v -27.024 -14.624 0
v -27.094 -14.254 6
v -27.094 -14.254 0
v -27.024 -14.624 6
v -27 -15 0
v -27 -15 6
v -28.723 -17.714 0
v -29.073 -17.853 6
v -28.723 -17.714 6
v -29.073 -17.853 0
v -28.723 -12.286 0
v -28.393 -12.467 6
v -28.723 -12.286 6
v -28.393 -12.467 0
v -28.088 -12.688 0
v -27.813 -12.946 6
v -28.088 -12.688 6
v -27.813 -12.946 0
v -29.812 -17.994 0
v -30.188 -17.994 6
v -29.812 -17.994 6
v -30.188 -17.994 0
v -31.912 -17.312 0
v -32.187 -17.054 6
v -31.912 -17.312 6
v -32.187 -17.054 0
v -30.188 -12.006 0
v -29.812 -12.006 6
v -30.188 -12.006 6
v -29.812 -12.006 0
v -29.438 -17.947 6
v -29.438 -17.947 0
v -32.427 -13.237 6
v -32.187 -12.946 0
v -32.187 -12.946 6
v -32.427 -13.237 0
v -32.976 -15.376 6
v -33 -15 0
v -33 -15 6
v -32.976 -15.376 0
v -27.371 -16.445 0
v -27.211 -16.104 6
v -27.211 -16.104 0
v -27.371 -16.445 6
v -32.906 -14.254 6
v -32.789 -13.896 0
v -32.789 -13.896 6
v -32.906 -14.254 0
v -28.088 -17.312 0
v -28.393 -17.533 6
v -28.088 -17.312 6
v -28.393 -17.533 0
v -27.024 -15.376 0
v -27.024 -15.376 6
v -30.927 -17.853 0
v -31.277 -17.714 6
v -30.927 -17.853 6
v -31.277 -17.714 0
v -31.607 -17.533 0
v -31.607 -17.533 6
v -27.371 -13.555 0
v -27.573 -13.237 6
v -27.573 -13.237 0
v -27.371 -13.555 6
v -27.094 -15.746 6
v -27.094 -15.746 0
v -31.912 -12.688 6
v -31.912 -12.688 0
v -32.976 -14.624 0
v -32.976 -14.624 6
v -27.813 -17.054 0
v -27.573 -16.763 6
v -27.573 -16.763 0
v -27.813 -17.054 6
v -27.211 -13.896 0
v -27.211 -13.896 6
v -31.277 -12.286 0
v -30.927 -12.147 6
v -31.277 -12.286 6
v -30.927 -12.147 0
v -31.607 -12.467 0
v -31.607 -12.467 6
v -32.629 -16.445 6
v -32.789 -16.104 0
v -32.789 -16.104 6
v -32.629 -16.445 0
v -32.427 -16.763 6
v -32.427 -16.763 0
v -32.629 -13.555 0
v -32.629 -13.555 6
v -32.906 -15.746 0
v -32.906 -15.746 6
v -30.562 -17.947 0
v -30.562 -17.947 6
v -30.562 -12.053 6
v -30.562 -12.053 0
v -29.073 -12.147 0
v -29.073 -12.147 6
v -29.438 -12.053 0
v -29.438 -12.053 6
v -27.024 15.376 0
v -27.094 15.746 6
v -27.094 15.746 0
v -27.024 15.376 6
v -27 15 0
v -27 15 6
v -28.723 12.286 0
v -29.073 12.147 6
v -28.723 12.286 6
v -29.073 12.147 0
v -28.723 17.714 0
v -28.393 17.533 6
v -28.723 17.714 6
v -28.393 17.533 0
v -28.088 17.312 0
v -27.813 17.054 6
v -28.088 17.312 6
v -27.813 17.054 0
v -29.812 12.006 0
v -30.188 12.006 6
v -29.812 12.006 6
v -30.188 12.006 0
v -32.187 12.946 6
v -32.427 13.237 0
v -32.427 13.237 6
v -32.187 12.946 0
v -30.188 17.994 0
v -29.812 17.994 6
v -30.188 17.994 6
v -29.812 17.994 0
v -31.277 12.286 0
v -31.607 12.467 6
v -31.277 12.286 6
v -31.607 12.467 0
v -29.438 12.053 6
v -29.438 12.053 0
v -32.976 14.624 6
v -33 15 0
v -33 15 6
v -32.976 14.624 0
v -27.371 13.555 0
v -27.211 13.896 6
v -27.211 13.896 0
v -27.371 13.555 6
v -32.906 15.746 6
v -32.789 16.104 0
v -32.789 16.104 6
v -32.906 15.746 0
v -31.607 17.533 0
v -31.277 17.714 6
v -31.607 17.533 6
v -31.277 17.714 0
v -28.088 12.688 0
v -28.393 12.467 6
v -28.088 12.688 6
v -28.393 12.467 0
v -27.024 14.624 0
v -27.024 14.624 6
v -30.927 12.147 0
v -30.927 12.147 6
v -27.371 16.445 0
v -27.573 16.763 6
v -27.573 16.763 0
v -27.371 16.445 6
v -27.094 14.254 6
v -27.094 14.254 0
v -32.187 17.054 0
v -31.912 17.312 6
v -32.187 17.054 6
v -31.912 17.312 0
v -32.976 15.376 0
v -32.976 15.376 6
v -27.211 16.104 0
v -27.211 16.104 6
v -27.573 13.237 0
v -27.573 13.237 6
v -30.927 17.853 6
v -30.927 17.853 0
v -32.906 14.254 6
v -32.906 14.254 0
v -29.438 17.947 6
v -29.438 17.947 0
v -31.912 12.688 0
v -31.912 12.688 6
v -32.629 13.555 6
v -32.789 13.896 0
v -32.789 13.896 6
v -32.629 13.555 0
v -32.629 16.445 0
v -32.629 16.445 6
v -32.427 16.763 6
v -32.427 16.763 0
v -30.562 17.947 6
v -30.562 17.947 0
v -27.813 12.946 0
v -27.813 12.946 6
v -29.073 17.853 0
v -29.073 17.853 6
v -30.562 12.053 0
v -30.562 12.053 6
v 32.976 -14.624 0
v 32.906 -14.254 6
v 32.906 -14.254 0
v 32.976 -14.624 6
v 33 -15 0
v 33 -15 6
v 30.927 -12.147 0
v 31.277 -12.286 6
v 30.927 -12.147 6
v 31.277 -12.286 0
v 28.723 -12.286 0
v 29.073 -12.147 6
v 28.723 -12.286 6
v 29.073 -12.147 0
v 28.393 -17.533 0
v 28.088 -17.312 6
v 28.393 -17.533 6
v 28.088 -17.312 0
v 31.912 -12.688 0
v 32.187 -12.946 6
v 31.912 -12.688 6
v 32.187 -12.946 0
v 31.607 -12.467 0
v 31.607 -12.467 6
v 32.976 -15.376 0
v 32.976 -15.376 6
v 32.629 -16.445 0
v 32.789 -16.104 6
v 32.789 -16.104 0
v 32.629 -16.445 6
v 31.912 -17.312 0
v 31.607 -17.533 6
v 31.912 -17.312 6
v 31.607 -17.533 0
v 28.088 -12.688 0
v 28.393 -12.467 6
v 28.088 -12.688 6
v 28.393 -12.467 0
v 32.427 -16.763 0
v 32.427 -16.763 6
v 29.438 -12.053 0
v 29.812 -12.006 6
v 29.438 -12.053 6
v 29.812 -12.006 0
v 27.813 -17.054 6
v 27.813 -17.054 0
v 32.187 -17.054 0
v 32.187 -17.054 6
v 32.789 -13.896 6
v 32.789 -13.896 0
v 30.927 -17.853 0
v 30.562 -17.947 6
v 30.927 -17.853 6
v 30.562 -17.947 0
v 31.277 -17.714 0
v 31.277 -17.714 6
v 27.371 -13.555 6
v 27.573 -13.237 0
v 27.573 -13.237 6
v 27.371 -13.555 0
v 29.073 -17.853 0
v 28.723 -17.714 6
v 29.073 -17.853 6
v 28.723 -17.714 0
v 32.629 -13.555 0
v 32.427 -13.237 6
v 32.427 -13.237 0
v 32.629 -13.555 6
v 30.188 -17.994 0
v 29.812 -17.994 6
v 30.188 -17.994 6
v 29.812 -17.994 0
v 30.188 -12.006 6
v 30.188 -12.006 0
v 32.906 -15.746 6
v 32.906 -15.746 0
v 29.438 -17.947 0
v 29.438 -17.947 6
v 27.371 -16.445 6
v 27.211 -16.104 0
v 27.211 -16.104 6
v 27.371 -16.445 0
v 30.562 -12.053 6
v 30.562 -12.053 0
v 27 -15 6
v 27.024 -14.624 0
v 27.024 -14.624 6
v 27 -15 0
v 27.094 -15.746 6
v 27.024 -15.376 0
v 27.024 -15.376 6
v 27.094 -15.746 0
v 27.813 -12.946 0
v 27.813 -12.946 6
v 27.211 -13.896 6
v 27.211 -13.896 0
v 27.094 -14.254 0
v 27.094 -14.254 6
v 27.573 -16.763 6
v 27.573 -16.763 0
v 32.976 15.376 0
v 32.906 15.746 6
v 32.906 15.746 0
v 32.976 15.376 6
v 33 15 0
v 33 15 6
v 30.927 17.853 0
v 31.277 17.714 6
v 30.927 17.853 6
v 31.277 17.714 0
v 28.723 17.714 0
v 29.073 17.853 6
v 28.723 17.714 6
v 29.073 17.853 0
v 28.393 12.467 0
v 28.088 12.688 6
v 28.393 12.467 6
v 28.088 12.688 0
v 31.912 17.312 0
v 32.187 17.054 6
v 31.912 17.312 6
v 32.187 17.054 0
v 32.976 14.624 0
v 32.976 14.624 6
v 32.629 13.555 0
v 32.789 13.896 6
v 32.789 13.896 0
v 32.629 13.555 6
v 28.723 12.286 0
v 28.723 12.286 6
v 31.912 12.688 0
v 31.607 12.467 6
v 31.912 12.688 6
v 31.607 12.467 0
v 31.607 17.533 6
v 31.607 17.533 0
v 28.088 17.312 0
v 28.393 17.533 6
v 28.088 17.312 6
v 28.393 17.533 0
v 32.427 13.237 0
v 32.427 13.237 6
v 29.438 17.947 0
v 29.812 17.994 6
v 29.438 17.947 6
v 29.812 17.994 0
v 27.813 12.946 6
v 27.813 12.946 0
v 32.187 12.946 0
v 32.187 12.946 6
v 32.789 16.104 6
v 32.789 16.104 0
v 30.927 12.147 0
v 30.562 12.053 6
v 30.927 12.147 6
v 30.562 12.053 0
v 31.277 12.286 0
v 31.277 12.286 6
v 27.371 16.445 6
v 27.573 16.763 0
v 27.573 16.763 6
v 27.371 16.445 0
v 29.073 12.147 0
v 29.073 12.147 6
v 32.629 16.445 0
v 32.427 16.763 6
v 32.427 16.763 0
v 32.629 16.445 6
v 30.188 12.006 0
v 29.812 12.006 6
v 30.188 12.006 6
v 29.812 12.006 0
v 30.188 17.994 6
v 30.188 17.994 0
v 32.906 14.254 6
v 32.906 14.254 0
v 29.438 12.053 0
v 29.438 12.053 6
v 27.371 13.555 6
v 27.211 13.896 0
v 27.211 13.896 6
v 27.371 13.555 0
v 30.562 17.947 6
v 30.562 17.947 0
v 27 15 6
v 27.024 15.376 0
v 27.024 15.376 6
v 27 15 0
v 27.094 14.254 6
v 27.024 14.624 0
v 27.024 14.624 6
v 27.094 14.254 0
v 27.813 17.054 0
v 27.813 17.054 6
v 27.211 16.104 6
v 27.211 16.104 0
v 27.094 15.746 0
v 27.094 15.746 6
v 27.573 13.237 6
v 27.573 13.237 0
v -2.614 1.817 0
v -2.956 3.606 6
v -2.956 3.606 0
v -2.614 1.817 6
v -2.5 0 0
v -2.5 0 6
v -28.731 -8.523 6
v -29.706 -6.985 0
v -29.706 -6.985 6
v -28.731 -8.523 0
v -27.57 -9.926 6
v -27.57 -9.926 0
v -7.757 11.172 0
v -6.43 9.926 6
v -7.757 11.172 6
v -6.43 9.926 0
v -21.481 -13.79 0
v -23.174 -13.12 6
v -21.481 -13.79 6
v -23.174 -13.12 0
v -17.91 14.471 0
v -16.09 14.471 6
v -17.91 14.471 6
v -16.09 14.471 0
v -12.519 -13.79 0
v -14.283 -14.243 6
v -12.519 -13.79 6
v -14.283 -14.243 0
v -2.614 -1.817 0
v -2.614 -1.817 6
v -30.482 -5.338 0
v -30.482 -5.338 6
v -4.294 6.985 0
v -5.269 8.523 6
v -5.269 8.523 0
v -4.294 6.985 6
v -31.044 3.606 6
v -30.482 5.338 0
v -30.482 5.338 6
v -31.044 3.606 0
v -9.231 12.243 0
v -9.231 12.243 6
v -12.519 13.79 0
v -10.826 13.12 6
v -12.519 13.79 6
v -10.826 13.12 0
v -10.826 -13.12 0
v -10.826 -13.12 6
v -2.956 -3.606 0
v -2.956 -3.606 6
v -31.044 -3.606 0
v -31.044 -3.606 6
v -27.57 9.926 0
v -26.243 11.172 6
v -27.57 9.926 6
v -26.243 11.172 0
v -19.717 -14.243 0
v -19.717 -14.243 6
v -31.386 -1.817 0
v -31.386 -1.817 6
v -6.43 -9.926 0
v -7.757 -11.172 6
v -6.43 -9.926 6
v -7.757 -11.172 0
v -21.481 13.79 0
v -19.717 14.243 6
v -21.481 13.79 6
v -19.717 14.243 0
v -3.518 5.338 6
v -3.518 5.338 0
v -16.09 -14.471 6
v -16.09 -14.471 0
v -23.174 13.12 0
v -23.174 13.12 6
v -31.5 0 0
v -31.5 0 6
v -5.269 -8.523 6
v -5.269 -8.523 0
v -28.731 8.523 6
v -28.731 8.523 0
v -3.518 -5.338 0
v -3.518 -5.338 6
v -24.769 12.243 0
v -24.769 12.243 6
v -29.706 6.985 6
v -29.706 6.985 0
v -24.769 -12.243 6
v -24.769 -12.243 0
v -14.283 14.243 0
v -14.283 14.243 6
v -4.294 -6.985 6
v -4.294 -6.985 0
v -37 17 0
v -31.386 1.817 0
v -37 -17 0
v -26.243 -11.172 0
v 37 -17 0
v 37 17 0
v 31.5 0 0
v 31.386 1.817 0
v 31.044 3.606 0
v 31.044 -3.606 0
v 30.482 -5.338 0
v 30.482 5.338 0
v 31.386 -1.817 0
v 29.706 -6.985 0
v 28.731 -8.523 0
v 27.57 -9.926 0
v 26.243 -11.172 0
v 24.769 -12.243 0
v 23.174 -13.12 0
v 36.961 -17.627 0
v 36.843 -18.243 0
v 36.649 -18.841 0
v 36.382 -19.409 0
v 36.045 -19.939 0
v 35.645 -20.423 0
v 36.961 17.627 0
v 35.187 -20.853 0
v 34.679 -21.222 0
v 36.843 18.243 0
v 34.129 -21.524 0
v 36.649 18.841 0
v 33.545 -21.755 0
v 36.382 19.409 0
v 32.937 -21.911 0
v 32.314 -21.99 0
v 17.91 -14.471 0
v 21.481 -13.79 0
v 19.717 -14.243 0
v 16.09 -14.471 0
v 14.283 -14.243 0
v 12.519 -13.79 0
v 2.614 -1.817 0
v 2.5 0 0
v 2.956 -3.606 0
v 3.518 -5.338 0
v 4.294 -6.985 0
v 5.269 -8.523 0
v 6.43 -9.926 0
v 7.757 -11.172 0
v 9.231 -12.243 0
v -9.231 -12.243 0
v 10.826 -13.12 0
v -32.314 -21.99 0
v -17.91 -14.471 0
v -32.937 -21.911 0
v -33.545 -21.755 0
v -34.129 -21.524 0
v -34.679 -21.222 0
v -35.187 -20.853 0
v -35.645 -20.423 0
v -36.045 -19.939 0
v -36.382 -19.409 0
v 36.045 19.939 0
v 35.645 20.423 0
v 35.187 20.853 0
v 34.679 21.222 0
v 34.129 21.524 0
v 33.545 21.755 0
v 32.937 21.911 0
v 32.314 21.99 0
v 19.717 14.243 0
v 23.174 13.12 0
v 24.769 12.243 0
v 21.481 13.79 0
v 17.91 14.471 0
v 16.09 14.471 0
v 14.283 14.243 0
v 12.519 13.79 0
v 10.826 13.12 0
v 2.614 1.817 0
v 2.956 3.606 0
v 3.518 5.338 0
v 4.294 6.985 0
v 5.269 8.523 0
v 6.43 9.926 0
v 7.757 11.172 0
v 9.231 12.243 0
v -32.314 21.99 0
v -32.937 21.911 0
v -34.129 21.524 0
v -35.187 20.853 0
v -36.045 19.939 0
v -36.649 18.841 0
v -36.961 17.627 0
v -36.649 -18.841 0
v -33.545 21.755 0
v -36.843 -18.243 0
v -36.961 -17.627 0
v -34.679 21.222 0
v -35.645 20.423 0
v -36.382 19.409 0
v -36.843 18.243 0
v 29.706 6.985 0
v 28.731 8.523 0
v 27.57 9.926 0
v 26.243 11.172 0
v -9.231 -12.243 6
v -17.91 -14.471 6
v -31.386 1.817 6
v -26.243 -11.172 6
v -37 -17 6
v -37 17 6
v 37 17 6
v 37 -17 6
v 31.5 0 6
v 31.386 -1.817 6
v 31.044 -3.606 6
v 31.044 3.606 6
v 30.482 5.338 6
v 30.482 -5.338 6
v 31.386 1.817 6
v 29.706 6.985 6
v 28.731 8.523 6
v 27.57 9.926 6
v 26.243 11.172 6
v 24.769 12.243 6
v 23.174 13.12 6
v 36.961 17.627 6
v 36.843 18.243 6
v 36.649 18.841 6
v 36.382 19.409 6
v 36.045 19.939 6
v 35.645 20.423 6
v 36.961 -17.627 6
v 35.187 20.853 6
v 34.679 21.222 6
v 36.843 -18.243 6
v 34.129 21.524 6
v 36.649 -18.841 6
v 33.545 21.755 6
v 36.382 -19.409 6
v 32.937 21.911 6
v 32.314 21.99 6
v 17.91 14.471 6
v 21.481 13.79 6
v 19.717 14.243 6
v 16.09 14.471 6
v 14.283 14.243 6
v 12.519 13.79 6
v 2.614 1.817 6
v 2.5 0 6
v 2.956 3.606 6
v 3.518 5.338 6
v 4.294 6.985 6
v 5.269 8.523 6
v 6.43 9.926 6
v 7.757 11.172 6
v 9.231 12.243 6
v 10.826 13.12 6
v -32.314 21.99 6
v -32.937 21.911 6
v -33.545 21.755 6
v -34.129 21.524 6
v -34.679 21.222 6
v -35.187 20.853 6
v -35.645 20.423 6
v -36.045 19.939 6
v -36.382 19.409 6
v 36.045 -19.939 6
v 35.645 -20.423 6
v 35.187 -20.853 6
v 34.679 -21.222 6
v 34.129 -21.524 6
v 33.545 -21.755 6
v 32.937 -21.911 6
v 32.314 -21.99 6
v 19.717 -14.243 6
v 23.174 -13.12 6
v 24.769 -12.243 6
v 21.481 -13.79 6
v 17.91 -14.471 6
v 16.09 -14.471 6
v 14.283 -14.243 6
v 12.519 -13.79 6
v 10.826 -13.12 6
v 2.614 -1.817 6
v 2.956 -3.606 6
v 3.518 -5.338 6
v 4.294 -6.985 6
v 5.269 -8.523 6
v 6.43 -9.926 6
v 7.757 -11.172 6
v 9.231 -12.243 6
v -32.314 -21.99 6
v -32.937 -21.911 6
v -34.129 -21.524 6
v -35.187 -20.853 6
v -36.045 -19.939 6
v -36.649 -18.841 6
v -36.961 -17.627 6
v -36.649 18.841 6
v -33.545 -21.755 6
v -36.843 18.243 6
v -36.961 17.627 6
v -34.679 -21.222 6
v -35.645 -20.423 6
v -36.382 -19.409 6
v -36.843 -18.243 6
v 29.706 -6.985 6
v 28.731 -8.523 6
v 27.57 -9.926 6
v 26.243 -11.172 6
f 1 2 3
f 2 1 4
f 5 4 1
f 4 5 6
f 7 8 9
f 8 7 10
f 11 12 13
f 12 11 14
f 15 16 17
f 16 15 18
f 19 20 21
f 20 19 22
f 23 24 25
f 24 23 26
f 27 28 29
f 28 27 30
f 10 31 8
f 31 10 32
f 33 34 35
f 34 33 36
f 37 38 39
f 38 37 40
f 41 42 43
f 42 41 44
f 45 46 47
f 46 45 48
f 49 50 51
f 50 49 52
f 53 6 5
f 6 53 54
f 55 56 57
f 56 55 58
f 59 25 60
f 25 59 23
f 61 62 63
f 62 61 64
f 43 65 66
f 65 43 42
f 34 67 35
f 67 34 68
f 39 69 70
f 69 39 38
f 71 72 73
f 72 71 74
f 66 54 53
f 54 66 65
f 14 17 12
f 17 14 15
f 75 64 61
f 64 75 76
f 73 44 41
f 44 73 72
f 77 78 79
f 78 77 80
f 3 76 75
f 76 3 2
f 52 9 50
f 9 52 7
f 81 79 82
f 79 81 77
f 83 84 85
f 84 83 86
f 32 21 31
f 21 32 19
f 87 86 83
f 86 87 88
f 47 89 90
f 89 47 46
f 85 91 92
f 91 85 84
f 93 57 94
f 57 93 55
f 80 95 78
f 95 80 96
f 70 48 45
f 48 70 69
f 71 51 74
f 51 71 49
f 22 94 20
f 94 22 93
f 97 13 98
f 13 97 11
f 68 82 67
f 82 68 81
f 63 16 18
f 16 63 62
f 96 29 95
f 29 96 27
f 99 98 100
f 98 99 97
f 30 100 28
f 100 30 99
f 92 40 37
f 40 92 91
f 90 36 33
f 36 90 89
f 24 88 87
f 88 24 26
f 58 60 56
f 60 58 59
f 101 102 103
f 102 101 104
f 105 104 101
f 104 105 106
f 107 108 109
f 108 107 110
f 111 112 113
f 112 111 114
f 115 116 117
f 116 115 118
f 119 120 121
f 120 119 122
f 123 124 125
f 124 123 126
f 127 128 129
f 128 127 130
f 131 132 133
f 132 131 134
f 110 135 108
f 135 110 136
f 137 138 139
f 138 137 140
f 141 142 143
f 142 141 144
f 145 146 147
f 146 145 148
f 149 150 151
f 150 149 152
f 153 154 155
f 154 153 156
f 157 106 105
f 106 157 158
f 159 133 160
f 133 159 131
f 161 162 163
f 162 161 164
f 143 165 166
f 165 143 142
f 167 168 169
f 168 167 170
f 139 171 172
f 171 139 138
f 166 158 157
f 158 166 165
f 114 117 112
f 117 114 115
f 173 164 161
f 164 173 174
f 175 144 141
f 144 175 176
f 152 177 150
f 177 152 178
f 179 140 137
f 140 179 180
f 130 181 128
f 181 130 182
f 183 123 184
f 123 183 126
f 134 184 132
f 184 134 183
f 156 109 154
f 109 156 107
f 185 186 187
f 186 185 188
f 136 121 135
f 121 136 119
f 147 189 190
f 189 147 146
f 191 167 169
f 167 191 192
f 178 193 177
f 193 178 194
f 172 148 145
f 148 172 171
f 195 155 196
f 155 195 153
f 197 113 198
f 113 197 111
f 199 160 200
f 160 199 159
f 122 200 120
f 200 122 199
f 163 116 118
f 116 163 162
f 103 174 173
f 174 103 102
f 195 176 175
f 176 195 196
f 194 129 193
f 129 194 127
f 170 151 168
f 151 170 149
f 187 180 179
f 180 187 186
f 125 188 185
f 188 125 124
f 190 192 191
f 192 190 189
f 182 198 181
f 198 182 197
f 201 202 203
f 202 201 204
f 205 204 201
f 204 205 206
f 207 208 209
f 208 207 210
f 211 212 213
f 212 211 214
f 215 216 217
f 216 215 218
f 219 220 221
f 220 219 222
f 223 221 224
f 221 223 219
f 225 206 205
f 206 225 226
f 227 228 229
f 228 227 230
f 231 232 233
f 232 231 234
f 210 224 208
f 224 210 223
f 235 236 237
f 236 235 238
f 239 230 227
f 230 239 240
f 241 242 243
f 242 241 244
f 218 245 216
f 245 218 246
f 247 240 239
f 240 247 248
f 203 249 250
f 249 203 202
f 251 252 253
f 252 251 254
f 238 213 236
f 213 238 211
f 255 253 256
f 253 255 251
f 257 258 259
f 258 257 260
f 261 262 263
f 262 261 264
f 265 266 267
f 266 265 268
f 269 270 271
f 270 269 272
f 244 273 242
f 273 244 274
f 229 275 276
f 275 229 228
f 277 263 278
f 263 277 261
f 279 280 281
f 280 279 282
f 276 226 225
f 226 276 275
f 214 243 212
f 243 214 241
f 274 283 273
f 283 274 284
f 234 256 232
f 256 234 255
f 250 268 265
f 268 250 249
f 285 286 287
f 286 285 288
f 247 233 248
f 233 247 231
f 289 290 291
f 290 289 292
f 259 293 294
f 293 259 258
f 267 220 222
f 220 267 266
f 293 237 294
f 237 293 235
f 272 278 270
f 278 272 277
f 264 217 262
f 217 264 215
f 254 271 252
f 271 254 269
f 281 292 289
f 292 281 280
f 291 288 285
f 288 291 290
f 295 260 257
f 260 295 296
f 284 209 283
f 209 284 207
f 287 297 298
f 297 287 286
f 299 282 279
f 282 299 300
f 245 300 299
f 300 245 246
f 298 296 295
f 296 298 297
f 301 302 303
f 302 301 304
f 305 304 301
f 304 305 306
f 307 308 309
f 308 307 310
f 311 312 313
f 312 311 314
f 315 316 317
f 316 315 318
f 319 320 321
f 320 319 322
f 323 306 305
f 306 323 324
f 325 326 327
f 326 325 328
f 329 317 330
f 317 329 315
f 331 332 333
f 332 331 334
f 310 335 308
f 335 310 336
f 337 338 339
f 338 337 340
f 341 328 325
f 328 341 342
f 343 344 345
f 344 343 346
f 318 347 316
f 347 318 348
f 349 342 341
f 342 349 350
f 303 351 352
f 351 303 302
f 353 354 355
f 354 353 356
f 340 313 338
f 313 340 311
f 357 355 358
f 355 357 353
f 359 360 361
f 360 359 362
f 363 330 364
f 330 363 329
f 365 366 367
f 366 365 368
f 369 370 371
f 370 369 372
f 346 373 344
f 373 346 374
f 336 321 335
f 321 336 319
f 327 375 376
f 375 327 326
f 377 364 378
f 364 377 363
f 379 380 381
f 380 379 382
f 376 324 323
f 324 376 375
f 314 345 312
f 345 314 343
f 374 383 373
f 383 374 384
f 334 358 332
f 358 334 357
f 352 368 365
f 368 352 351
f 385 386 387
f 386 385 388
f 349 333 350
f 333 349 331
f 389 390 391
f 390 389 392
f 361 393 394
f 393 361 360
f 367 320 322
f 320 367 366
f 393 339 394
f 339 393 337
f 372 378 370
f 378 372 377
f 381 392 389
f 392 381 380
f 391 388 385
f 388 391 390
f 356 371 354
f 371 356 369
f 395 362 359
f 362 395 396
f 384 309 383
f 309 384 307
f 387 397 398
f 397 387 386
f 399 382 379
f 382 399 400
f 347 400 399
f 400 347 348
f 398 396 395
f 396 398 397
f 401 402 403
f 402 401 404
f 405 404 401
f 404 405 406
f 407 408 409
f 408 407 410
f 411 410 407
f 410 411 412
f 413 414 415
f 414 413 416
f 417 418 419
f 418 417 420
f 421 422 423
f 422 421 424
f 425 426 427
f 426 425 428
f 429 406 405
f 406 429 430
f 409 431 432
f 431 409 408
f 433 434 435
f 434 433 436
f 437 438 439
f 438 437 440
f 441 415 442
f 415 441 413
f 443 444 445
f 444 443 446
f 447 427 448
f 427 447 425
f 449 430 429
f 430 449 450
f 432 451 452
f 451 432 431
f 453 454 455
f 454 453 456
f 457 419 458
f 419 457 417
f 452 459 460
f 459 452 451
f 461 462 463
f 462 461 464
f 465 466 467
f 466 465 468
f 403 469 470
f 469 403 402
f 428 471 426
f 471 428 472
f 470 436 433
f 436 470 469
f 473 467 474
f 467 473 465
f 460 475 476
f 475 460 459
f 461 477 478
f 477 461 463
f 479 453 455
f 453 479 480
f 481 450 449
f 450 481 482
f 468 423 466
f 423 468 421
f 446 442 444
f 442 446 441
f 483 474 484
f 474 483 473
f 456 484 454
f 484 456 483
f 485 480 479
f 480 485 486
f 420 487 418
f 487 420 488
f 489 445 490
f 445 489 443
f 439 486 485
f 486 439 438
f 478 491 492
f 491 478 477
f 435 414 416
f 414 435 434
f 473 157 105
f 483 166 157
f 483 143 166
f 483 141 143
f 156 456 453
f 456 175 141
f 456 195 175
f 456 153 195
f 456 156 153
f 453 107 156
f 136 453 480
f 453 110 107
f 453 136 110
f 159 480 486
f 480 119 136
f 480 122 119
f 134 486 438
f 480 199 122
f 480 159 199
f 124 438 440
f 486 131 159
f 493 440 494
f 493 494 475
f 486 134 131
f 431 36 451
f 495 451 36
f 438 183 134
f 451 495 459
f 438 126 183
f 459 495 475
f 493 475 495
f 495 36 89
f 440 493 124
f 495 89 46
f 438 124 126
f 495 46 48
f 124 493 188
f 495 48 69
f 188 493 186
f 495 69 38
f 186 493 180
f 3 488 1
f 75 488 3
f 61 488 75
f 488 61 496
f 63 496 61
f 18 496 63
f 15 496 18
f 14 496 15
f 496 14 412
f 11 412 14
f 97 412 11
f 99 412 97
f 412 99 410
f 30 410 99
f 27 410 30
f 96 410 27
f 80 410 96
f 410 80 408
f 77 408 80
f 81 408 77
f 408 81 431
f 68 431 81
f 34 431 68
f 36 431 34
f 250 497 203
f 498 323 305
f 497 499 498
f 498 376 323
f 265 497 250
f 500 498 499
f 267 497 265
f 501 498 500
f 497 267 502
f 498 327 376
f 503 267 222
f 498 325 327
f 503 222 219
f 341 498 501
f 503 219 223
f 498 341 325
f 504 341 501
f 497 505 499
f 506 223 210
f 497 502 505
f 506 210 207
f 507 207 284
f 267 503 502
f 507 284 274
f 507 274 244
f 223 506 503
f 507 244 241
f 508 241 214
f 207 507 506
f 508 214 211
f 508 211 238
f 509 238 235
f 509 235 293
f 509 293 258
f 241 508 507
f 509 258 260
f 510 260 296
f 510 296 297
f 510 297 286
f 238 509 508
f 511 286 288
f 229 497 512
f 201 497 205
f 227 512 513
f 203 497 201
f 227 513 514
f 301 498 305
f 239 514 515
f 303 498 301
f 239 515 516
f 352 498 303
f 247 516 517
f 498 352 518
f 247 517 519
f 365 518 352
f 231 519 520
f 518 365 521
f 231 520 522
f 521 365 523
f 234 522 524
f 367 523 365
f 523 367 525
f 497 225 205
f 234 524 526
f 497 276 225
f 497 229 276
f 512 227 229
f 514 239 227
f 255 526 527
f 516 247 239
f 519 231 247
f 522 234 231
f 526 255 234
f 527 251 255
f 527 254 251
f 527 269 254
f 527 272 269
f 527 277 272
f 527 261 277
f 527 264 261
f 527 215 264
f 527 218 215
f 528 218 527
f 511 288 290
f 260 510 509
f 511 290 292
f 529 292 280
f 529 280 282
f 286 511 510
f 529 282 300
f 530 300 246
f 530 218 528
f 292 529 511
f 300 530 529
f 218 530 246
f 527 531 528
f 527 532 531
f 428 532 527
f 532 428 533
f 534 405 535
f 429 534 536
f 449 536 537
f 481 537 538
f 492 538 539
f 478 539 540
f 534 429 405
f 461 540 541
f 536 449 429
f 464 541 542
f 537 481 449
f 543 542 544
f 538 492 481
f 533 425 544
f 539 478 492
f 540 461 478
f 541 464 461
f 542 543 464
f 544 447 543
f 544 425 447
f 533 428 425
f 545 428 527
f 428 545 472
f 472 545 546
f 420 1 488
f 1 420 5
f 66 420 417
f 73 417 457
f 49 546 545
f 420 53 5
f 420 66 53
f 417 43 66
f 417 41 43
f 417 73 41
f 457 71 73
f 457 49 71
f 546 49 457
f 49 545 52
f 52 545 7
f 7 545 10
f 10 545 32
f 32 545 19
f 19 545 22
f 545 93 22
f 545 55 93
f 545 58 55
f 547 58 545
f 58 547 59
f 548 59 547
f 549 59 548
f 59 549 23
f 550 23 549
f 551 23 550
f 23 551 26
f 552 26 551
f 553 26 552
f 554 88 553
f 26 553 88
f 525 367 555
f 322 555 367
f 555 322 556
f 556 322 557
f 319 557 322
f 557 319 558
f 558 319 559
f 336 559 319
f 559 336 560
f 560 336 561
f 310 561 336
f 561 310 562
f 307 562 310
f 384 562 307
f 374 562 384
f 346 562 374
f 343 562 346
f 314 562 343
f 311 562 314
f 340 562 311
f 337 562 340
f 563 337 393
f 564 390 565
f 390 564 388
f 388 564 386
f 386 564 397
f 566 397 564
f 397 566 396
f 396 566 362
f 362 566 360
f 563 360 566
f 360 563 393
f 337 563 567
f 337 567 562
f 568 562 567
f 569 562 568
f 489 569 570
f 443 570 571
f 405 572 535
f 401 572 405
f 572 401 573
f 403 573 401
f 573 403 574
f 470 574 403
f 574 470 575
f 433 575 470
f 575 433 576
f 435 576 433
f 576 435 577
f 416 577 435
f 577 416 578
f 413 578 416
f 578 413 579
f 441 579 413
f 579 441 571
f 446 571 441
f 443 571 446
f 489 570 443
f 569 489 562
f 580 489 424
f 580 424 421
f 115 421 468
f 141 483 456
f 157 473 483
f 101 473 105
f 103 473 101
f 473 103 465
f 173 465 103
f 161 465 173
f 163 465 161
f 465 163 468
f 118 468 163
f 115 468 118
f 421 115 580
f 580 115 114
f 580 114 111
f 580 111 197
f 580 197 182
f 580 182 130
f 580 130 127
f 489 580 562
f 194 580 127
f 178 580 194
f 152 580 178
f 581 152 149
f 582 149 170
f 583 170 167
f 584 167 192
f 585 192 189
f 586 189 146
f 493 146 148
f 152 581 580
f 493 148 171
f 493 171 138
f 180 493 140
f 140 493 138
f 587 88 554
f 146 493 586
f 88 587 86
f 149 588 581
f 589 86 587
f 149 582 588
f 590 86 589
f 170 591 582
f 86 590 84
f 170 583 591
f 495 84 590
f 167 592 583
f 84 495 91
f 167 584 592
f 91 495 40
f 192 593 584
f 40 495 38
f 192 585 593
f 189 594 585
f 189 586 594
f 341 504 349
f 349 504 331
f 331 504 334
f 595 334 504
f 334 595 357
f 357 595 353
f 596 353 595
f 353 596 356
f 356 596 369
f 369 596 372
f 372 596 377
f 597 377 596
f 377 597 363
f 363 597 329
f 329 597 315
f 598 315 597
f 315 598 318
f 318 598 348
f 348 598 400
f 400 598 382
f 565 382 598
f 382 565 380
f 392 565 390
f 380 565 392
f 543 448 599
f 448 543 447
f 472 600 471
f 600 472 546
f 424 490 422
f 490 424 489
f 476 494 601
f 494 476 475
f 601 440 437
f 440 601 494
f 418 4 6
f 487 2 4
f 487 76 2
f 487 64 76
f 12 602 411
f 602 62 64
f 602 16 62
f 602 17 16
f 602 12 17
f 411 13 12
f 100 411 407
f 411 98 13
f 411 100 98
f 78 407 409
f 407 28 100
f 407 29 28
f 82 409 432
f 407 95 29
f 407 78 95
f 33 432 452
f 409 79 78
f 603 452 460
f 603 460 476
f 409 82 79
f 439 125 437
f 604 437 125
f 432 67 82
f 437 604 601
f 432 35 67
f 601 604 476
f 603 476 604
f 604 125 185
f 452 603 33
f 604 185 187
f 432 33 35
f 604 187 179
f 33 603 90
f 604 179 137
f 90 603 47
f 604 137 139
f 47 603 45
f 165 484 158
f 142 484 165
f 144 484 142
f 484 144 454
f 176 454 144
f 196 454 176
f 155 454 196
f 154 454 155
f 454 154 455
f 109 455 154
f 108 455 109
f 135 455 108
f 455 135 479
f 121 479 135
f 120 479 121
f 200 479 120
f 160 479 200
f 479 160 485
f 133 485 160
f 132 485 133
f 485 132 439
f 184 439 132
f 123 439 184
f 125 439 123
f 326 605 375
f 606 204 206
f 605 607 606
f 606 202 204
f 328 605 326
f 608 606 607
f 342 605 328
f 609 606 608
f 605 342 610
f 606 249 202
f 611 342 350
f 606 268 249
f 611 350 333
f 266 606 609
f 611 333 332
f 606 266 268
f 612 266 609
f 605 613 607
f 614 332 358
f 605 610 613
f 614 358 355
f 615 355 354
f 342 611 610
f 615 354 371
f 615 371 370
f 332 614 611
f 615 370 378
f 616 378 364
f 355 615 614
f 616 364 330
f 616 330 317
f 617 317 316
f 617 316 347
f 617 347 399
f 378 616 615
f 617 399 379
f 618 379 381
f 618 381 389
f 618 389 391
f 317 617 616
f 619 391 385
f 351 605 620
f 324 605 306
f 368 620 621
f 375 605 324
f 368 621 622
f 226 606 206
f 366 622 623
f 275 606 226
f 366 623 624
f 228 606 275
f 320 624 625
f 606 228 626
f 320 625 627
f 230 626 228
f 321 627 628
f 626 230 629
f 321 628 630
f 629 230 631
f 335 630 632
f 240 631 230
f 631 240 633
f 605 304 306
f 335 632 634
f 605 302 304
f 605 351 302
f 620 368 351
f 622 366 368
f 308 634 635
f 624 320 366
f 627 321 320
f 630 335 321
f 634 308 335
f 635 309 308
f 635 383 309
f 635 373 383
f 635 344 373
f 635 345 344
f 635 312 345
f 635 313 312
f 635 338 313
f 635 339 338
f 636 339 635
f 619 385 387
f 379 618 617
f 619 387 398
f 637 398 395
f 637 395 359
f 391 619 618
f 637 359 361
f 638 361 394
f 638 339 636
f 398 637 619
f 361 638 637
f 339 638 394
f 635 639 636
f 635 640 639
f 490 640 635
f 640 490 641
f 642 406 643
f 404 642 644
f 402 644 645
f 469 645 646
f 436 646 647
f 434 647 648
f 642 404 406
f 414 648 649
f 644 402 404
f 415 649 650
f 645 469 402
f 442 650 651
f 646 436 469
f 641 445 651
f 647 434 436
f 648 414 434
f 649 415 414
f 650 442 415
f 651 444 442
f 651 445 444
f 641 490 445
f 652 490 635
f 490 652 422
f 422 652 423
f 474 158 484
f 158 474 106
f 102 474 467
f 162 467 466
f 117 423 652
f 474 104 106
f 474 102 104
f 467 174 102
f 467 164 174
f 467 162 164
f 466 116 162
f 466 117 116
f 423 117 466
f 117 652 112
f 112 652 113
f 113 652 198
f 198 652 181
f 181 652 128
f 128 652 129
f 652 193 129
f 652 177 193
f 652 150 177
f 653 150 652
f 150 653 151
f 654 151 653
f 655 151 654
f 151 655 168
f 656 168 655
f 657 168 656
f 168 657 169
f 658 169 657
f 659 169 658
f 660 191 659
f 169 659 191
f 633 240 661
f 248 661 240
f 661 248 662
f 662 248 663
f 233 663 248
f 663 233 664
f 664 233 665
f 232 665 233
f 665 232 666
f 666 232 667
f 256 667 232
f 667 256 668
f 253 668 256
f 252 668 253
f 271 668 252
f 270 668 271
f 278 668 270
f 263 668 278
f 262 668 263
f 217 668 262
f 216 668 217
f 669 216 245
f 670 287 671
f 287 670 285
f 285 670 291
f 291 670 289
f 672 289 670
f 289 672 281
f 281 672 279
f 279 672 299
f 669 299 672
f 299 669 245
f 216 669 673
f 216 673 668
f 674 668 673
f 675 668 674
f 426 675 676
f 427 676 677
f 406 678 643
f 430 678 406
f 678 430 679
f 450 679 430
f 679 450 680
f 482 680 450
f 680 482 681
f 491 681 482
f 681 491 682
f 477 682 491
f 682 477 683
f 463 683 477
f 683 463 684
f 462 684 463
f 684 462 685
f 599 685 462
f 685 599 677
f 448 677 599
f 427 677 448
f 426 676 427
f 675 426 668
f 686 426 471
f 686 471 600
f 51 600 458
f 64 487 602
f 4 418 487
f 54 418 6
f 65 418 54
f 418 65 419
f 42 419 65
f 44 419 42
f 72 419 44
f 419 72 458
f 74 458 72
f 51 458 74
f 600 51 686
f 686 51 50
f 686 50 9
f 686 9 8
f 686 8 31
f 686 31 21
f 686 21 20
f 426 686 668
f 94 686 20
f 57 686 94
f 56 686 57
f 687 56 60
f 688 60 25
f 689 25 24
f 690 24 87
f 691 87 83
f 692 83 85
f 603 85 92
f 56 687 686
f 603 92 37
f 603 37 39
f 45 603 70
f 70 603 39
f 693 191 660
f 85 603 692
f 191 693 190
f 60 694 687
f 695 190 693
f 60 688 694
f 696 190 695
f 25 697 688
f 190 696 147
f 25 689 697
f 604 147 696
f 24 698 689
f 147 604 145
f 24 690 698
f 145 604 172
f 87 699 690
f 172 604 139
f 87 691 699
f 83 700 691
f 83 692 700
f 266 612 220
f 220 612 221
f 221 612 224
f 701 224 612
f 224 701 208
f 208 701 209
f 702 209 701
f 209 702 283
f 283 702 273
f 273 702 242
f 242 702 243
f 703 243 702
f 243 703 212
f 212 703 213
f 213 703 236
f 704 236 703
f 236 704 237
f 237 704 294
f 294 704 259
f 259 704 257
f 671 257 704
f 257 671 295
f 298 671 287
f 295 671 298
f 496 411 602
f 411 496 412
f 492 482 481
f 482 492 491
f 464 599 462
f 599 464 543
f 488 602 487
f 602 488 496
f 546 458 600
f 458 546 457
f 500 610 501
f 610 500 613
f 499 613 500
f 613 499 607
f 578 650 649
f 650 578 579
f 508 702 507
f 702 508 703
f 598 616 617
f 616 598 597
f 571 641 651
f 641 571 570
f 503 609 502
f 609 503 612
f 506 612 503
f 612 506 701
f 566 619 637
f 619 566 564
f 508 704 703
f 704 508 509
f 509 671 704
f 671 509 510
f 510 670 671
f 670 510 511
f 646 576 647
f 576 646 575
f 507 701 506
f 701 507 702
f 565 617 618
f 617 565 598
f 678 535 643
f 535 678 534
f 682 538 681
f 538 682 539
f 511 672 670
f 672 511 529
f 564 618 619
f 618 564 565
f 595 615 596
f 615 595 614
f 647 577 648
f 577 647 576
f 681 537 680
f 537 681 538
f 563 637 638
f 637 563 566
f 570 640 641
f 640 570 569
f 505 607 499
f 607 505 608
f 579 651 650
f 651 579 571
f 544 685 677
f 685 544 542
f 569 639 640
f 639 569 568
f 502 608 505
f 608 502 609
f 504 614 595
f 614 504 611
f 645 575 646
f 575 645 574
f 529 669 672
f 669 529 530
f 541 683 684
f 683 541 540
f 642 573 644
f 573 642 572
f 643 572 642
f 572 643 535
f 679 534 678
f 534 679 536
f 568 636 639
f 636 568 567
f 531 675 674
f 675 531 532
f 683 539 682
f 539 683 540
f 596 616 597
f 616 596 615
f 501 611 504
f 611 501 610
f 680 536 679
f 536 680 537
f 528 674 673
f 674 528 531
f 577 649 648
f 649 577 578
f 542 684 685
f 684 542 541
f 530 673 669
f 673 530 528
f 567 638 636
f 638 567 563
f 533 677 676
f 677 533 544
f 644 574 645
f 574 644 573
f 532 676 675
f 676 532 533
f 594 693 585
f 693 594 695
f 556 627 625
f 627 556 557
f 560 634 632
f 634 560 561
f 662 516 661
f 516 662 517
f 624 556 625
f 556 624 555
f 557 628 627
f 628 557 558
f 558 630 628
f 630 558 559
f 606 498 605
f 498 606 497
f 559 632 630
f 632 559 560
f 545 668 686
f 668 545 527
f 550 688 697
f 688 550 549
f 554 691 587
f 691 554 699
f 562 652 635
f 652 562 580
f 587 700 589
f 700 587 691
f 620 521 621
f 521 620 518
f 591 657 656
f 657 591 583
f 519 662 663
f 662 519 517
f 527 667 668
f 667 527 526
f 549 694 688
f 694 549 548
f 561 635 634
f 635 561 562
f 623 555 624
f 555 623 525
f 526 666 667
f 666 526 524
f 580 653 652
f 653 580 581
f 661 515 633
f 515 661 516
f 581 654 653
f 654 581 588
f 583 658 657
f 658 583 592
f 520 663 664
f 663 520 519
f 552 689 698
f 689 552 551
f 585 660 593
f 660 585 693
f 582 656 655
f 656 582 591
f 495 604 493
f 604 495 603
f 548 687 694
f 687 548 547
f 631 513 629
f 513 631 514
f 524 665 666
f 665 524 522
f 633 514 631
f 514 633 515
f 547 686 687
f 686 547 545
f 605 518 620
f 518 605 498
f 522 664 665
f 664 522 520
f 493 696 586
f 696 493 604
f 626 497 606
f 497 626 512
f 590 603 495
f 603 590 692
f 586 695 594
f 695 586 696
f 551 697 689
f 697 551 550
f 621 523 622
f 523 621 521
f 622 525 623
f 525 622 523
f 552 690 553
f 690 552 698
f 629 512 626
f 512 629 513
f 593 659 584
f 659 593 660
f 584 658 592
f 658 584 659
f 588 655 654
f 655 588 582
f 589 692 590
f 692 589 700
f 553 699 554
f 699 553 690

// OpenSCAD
$fn = 50;


difference() {
	union() {
		hull() {
			translate(v = [-32.0000000000, 17.0000000000, 0]) {
				cylinder(h = 6, r = 5);
			}
			translate(v = [32.0000000000, 17.0000000000, 0]) {
				cylinder(h = 6, r = 5);
			}
			translate(v = [-32.0000000000, -17.0000000000, 0]) {
				cylinder(h = 6, r = 5);
			}
			translate(v = [32.0000000000, -17.0000000000, 0]) {
				cylinder(h = 6, r = 5);
			}
		}
	}
	union() {
		#translate(v = [-30.0000000000, -15.0000000000, -100.0000000000]) {
			cylinder(h = 200, r = 3.0000000000);
		}
		#translate(v = [-30.0000000000, 15.0000000000, -100.0000000000]) {
			cylinder(h = 200, r = 3.0000000000);
		}
		#translate(v = [30.0000000000, -15.0000000000, -100.0000000000]) {
			cylinder(h = 200, r = 3.0000000000);
		}
		#translate(v = [30.0000000000, 15.0000000000, -100.0000000000]) {
			cylinder(h = 200, r = 3.0000000000);
		}
		#translate(v = [-17.0000000000, 0, 0]) {
			cylinder(h = 6, r = 14.5000000000);
		}
		#translate(v = [17.0000000000, 0, 0]) {
			cylinder(h = 6, r = 14.5000000000);
		}
	}
}
